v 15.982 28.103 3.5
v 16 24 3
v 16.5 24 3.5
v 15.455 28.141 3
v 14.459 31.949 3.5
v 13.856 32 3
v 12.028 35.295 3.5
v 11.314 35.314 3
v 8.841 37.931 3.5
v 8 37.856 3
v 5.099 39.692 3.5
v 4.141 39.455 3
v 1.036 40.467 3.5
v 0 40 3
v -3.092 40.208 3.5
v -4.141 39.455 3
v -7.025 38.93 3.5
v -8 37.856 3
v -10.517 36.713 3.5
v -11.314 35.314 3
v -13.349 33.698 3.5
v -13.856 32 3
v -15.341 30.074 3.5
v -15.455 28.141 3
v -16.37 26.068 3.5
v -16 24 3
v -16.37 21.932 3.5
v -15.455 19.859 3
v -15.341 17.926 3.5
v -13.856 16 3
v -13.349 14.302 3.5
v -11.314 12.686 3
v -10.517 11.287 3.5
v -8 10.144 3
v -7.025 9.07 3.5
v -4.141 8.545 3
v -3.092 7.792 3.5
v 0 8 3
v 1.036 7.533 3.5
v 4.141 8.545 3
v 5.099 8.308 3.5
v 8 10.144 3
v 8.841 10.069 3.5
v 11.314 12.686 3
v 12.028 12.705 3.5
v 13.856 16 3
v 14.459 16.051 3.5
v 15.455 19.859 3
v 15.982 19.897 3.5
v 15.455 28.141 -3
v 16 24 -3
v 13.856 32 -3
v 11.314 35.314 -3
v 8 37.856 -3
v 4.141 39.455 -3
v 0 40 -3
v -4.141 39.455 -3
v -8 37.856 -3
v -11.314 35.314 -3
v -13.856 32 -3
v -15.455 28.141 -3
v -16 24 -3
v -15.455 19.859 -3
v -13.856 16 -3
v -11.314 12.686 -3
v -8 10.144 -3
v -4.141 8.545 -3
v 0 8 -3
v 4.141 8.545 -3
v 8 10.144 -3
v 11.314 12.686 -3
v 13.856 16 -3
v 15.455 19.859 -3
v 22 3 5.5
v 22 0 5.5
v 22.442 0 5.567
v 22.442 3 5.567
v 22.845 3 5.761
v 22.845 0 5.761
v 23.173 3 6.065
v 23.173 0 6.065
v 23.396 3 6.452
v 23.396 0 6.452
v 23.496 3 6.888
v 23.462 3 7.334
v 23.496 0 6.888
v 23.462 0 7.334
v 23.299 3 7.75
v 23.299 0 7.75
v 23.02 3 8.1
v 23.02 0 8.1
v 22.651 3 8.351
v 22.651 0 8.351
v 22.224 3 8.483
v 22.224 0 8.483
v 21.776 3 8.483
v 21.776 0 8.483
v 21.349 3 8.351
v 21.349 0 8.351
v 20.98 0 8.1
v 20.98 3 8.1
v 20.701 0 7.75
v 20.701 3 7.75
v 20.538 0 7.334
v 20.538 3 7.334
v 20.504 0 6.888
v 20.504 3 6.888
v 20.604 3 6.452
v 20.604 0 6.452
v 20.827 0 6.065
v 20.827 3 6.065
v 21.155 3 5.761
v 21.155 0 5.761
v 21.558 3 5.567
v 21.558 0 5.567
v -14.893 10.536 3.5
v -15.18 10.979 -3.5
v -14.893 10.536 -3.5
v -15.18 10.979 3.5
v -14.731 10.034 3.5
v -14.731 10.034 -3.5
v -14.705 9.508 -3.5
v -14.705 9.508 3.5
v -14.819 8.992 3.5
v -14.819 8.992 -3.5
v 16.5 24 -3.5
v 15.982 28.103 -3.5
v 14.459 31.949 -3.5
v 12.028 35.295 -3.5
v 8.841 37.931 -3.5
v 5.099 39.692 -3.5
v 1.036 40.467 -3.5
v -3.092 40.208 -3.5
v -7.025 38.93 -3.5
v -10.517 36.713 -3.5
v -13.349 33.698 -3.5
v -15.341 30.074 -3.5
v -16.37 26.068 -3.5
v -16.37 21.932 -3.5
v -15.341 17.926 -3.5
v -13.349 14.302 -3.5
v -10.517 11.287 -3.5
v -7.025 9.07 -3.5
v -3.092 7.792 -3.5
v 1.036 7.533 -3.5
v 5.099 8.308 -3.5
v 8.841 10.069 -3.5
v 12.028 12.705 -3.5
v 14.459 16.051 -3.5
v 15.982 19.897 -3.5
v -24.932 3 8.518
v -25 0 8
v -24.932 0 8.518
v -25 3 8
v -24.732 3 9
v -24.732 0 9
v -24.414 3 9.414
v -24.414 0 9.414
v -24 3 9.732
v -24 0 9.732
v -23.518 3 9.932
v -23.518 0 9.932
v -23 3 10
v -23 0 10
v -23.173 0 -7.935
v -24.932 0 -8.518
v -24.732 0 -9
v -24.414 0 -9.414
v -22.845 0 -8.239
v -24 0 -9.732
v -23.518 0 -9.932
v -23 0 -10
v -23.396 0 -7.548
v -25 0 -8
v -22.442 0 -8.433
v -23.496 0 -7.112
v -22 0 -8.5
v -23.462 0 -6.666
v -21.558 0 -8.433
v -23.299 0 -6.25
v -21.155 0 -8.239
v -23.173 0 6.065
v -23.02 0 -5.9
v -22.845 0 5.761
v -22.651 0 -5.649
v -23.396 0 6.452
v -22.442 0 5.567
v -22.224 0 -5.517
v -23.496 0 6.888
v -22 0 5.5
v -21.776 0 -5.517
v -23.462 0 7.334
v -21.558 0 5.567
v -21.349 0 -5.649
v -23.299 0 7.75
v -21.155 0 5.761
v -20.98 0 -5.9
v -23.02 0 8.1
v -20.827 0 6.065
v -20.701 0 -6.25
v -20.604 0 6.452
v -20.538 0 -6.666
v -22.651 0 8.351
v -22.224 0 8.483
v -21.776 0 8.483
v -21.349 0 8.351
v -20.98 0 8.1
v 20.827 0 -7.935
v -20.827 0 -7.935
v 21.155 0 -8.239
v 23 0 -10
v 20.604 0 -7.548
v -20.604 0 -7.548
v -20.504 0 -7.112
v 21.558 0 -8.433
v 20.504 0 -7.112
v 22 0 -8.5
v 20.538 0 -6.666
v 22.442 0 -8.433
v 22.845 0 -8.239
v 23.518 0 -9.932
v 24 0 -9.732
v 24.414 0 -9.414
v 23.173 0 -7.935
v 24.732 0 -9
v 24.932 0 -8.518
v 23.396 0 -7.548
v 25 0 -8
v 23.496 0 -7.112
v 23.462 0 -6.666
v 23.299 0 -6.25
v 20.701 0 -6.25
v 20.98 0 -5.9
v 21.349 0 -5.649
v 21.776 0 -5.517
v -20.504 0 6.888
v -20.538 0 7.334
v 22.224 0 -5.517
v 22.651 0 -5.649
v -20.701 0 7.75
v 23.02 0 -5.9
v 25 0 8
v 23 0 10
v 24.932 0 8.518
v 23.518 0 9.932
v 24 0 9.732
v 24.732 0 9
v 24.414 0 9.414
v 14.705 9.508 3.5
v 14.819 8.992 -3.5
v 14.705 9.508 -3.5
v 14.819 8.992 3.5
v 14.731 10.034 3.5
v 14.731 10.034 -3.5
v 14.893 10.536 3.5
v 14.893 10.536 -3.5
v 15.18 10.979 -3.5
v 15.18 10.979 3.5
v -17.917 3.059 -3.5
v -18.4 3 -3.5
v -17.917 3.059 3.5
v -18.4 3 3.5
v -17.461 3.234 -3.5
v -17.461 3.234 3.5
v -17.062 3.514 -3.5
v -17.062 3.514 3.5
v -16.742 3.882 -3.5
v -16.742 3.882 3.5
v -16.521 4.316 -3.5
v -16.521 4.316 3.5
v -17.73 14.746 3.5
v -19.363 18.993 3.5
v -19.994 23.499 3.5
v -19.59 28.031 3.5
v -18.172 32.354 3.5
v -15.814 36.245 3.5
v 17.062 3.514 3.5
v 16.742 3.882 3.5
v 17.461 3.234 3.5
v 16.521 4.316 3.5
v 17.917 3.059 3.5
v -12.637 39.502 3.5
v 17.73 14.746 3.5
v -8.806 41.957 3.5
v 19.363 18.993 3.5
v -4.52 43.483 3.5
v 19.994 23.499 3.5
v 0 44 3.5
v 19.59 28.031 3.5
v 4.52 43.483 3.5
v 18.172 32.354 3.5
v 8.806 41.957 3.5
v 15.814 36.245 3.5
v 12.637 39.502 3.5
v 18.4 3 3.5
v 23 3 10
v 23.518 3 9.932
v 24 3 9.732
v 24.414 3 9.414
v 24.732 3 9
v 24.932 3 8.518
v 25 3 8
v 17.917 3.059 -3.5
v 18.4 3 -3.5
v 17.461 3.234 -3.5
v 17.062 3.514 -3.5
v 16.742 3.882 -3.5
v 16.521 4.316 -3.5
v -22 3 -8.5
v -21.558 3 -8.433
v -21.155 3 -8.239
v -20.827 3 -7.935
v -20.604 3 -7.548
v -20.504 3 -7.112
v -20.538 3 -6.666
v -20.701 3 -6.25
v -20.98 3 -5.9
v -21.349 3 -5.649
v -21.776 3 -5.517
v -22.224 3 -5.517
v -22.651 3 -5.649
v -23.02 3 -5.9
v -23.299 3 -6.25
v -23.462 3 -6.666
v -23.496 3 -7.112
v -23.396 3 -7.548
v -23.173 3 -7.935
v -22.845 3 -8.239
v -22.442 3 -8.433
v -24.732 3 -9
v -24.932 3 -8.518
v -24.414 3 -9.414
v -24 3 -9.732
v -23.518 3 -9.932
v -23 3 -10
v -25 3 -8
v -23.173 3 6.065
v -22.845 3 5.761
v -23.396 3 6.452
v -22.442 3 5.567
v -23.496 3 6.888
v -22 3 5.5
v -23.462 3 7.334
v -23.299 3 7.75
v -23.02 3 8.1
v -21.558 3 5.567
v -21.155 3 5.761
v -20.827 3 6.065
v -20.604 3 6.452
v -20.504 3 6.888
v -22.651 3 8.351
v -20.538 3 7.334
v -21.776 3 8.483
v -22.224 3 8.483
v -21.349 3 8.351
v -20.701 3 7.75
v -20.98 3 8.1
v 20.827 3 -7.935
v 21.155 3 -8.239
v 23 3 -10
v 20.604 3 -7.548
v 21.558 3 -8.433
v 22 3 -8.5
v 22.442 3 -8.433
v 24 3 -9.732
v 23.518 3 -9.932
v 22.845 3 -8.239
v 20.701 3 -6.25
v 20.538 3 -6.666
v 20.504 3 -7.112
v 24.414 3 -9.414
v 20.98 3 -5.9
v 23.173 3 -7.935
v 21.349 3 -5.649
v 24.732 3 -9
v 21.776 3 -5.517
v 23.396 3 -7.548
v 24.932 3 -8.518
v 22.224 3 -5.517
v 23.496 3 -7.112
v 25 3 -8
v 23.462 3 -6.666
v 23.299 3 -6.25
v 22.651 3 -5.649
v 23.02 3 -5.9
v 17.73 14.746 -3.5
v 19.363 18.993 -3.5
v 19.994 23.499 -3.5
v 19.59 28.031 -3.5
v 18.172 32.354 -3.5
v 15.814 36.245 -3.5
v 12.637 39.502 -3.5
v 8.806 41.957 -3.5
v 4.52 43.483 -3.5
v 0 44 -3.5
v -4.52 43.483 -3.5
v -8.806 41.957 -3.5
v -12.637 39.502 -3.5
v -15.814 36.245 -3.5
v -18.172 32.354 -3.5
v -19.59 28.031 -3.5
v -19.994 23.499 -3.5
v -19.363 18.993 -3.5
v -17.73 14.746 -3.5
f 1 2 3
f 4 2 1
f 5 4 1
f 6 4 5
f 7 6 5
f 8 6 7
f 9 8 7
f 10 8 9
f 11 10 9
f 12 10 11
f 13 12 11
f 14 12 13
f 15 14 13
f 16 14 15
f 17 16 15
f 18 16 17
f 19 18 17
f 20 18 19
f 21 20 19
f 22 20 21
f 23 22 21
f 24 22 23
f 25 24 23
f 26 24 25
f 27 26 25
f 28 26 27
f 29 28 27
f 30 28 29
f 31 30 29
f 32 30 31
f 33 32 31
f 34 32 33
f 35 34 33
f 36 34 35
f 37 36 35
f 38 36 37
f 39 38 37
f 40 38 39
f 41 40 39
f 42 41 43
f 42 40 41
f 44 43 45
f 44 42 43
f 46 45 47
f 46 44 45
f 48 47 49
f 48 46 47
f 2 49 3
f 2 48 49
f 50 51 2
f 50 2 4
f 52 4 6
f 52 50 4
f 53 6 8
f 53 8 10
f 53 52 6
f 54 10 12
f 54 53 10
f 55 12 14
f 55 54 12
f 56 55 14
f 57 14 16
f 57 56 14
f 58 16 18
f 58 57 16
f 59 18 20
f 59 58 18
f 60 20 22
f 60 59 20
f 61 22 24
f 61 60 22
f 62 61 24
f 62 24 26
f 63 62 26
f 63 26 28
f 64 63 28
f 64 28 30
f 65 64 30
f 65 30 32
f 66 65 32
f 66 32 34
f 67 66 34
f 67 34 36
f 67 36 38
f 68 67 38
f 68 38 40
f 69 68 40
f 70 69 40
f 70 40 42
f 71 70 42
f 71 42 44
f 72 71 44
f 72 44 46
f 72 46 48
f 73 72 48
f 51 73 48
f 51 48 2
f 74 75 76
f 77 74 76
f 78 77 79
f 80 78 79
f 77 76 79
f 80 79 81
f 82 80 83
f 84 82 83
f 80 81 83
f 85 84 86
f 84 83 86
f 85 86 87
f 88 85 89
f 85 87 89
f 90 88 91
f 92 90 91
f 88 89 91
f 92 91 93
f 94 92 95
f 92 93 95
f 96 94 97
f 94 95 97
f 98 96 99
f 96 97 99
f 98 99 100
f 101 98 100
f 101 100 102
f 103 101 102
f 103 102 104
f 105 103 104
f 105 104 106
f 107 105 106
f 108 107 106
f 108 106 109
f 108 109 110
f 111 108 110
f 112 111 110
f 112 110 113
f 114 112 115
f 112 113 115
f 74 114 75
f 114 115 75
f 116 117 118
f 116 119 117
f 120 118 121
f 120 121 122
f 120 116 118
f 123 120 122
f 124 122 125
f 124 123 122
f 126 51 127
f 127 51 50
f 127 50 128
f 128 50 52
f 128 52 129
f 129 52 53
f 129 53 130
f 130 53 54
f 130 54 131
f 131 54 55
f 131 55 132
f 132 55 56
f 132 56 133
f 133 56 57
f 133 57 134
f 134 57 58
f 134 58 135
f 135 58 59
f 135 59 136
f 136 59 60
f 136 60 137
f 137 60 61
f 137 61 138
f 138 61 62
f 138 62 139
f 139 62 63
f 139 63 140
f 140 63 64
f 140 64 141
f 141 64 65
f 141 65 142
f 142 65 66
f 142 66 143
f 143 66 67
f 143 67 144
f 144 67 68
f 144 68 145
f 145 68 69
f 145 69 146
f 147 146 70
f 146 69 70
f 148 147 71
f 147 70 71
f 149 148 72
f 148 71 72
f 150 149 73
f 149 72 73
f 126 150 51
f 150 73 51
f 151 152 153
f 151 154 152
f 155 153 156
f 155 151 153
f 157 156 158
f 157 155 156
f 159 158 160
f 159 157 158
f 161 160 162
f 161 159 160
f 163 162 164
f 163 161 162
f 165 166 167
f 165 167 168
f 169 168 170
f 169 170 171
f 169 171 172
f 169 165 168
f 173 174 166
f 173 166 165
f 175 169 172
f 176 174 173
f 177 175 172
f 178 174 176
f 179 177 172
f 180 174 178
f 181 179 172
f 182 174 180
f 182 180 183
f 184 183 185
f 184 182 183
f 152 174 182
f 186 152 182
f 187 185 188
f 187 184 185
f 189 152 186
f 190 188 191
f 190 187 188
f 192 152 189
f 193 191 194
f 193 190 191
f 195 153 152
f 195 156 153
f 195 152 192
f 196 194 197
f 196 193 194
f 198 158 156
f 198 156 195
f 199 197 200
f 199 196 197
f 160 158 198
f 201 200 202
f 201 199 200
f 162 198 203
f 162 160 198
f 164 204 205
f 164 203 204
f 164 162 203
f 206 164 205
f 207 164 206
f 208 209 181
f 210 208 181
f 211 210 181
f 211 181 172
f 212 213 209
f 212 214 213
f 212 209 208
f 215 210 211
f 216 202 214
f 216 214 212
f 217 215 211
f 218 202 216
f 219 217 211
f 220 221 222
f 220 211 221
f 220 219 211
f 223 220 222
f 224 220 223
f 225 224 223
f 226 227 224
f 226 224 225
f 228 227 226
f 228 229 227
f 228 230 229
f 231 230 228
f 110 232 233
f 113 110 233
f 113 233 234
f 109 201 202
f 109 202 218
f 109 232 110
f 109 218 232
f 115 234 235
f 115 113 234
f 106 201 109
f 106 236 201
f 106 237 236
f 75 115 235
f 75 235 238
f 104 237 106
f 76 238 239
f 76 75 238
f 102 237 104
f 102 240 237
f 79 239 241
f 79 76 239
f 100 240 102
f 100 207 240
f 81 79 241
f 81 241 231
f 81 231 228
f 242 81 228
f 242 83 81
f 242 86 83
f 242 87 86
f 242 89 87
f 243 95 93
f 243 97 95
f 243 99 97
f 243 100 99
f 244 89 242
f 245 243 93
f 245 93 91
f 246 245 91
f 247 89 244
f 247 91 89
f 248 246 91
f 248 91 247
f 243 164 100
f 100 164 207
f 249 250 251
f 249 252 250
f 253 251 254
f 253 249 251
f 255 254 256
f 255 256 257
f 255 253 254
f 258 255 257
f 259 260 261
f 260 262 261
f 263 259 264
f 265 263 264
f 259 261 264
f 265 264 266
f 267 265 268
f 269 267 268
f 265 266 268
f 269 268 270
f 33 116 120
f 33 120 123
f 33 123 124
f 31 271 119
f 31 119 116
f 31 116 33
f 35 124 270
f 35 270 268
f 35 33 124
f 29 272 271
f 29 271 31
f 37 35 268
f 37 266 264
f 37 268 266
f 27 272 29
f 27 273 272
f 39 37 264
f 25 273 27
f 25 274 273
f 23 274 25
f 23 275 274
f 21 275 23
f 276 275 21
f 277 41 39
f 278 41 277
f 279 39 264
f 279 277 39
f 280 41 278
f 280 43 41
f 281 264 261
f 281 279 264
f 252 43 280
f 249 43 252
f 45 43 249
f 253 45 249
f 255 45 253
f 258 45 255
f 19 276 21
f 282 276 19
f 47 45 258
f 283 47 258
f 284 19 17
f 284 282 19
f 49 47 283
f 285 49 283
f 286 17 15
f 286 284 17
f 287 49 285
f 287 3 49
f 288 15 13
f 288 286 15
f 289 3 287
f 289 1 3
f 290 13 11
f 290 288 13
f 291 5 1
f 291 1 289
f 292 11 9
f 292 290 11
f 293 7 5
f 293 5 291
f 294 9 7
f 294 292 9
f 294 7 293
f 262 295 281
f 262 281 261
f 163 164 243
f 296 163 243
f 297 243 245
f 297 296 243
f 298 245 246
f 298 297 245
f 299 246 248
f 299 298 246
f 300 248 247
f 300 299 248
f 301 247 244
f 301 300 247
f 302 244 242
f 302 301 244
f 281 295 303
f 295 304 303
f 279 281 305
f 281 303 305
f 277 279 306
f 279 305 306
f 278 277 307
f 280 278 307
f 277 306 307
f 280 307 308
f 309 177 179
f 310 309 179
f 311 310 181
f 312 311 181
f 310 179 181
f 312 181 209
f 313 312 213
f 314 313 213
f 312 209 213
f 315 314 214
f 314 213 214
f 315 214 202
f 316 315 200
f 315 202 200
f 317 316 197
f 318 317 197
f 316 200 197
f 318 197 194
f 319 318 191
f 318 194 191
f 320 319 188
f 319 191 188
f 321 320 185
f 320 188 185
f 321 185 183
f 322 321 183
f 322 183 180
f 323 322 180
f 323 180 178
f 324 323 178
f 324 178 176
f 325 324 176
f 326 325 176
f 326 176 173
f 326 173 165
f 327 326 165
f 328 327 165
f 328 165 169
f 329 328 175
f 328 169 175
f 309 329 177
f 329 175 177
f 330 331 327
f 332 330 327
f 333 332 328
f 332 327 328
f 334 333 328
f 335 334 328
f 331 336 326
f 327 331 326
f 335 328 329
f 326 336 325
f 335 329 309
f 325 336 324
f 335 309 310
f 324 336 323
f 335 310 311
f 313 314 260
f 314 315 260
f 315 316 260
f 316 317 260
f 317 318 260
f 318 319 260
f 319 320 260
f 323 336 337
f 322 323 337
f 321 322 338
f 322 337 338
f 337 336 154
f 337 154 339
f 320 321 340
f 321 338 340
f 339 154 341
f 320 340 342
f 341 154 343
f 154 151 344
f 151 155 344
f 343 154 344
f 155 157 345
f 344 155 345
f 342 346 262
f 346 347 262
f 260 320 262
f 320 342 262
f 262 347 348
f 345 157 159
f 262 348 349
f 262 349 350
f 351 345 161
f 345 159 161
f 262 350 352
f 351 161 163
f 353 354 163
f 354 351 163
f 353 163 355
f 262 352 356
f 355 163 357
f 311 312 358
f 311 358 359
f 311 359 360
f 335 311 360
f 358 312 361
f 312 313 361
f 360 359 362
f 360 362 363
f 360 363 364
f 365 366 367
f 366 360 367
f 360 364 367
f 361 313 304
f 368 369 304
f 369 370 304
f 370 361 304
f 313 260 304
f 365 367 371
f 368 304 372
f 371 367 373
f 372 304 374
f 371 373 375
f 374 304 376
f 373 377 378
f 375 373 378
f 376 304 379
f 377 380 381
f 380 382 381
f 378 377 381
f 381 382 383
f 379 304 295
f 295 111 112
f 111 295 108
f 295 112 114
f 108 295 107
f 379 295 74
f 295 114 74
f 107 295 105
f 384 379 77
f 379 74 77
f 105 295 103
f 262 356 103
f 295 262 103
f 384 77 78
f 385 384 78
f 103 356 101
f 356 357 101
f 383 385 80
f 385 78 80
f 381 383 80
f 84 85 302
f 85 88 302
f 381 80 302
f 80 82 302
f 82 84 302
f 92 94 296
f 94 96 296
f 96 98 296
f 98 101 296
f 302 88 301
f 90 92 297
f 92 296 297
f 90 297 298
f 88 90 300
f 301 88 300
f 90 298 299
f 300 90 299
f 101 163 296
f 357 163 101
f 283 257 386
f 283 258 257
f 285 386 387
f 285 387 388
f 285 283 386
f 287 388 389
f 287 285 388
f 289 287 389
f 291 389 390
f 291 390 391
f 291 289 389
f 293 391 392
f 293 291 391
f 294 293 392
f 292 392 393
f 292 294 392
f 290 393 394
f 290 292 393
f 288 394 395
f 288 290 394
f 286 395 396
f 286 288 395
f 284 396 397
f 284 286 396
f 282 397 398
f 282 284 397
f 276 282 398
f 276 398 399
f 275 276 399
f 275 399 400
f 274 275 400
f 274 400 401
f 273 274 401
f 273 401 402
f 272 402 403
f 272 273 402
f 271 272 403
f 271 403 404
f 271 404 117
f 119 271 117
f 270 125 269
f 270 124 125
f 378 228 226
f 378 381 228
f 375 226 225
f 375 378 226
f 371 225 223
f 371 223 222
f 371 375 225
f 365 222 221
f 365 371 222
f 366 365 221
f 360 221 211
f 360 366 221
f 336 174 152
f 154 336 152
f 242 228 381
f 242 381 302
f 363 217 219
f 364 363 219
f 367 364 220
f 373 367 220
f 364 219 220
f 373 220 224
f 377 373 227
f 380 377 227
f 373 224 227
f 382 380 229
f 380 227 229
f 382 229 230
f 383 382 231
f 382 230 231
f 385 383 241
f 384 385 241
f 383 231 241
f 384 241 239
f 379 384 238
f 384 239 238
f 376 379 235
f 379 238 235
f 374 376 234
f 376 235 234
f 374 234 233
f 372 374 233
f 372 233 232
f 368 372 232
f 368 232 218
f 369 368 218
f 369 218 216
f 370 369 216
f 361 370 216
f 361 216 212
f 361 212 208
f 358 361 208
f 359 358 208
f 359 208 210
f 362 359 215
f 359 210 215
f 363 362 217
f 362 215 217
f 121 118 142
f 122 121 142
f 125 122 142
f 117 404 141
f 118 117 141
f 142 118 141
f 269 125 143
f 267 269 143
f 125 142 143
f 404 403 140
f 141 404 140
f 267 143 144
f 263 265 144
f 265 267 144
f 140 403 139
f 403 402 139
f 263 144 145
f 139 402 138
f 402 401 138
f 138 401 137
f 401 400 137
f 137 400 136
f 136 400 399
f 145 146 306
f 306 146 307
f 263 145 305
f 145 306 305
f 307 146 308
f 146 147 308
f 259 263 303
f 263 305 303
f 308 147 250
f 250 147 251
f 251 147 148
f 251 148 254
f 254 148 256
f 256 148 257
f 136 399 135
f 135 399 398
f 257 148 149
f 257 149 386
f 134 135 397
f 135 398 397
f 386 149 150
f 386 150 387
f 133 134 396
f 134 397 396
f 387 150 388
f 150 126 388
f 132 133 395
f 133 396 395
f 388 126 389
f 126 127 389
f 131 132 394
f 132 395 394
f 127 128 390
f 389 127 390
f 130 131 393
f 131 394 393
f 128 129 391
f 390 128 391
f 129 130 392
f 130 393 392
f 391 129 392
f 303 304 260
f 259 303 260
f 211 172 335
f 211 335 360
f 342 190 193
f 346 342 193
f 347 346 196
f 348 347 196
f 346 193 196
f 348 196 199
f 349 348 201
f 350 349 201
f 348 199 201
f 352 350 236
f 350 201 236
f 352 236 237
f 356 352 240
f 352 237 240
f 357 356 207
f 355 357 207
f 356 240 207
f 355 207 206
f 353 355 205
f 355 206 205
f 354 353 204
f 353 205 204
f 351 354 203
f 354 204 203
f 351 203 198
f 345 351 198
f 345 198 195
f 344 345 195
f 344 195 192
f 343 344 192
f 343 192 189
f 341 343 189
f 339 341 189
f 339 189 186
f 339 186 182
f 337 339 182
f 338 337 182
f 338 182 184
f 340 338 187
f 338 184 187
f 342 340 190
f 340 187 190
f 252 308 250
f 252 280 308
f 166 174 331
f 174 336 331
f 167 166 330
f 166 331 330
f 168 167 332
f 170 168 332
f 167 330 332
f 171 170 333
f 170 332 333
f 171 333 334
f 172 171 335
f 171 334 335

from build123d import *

# Parameters (mm, degrees)
SKETCH_1_R      = 16
EXTRUDE_1_DEPTH = 3.5
SKETCH_2_W      = 50
SKETCH_2_H      = 20
SKETCH_2_R      = 1.5
EXTRUDE_2_DEPTH = 3
FILLET_1_R      = 2
FILLET_2_R      = 2
CHAMFER_1_SIZE  = 0.5


with BuildPart() as part:
    # 草图1 → 凸台-拉伸1 (new, symmetric)
    with BuildSketch(Plane.XY):
        with BuildLine():
            Line((17, 3), (14.406055462, 10.126804045))
            ThreePointArc((14.406055462, 10.126804045), (0, 44), (-14.406055462, 10.126804045))
            Line((-14.406055462, 10.126804045), (-17, 3))
            Line((-17, 3), (-25, 3))
            Line((-25, 3), (-25, 0))
            Line((-25, 0), (25, 0))
            Line((25, 0), (25, 3))
            Line((25, 3), (17, 3))
        make_face()
        with Locations((0, 24)):
            Circle(SKETCH_1_R, mode=Mode.SUBTRACT)
    extrude(amount=EXTRUDE_1_DEPTH, both=True)

    # 草图2 → 凸台-拉伸2 (add)
    with BuildSketch(Plane.XZ):
        Rectangle(SKETCH_2_W, SKETCH_2_H)
        with Locations(Location((-22, -7, 0), (0, 0, 270))):
            Circle(SKETCH_2_R, mode=Mode.SUBTRACT)
        with Locations(Location((22, -7, 0), (0, 0, 270))):
            Circle(SKETCH_2_R, mode=Mode.SUBTRACT)
        with Locations(Location((22, 7, 0), (0, 0, 270))):
            Circle(SKETCH_2_R, mode=Mode.SUBTRACT)
        with Locations(Location((-22, 7, 0), (0, 0, 270))):
            Circle(SKETCH_2_R, mode=Mode.SUBTRACT)
    extrude(amount=-EXTRUDE_2_DEPTH)

    # 圆角1
    fillet_1_edges = [part.edges().sort_by_distance(p)[0] for p in [
        (14.406055462, 10.126804045, 0),
        (17, 3, 0),
        (-17, 3, 0),
        (-14.406055462, 10.126804045, 0),
    ]]
    fillet(fillet_1_edges, radius=FILLET_1_R)

    # 圆角2
    fillet_2_edges = [part.edges().sort_by_distance(p)[0] for p in [
        (-25, 1.5, 10),
        (25, 1.5, 10),
        (-25, 1.5, -10),
        (25, 1.5, -10),
    ]]
    fillet(fillet_2_edges, radius=FILLET_2_R)

    # 倒角1
    chamfer_1_edges = [part.edges().sort_by_distance(p)[0] for p in [
        (-16, 24, -3.5),
        (-16, 24, 3.5),
    ]]
    chamfer(chamfer_1_edges, length=CHAMFER_1_SIZE)


solid = part.part
